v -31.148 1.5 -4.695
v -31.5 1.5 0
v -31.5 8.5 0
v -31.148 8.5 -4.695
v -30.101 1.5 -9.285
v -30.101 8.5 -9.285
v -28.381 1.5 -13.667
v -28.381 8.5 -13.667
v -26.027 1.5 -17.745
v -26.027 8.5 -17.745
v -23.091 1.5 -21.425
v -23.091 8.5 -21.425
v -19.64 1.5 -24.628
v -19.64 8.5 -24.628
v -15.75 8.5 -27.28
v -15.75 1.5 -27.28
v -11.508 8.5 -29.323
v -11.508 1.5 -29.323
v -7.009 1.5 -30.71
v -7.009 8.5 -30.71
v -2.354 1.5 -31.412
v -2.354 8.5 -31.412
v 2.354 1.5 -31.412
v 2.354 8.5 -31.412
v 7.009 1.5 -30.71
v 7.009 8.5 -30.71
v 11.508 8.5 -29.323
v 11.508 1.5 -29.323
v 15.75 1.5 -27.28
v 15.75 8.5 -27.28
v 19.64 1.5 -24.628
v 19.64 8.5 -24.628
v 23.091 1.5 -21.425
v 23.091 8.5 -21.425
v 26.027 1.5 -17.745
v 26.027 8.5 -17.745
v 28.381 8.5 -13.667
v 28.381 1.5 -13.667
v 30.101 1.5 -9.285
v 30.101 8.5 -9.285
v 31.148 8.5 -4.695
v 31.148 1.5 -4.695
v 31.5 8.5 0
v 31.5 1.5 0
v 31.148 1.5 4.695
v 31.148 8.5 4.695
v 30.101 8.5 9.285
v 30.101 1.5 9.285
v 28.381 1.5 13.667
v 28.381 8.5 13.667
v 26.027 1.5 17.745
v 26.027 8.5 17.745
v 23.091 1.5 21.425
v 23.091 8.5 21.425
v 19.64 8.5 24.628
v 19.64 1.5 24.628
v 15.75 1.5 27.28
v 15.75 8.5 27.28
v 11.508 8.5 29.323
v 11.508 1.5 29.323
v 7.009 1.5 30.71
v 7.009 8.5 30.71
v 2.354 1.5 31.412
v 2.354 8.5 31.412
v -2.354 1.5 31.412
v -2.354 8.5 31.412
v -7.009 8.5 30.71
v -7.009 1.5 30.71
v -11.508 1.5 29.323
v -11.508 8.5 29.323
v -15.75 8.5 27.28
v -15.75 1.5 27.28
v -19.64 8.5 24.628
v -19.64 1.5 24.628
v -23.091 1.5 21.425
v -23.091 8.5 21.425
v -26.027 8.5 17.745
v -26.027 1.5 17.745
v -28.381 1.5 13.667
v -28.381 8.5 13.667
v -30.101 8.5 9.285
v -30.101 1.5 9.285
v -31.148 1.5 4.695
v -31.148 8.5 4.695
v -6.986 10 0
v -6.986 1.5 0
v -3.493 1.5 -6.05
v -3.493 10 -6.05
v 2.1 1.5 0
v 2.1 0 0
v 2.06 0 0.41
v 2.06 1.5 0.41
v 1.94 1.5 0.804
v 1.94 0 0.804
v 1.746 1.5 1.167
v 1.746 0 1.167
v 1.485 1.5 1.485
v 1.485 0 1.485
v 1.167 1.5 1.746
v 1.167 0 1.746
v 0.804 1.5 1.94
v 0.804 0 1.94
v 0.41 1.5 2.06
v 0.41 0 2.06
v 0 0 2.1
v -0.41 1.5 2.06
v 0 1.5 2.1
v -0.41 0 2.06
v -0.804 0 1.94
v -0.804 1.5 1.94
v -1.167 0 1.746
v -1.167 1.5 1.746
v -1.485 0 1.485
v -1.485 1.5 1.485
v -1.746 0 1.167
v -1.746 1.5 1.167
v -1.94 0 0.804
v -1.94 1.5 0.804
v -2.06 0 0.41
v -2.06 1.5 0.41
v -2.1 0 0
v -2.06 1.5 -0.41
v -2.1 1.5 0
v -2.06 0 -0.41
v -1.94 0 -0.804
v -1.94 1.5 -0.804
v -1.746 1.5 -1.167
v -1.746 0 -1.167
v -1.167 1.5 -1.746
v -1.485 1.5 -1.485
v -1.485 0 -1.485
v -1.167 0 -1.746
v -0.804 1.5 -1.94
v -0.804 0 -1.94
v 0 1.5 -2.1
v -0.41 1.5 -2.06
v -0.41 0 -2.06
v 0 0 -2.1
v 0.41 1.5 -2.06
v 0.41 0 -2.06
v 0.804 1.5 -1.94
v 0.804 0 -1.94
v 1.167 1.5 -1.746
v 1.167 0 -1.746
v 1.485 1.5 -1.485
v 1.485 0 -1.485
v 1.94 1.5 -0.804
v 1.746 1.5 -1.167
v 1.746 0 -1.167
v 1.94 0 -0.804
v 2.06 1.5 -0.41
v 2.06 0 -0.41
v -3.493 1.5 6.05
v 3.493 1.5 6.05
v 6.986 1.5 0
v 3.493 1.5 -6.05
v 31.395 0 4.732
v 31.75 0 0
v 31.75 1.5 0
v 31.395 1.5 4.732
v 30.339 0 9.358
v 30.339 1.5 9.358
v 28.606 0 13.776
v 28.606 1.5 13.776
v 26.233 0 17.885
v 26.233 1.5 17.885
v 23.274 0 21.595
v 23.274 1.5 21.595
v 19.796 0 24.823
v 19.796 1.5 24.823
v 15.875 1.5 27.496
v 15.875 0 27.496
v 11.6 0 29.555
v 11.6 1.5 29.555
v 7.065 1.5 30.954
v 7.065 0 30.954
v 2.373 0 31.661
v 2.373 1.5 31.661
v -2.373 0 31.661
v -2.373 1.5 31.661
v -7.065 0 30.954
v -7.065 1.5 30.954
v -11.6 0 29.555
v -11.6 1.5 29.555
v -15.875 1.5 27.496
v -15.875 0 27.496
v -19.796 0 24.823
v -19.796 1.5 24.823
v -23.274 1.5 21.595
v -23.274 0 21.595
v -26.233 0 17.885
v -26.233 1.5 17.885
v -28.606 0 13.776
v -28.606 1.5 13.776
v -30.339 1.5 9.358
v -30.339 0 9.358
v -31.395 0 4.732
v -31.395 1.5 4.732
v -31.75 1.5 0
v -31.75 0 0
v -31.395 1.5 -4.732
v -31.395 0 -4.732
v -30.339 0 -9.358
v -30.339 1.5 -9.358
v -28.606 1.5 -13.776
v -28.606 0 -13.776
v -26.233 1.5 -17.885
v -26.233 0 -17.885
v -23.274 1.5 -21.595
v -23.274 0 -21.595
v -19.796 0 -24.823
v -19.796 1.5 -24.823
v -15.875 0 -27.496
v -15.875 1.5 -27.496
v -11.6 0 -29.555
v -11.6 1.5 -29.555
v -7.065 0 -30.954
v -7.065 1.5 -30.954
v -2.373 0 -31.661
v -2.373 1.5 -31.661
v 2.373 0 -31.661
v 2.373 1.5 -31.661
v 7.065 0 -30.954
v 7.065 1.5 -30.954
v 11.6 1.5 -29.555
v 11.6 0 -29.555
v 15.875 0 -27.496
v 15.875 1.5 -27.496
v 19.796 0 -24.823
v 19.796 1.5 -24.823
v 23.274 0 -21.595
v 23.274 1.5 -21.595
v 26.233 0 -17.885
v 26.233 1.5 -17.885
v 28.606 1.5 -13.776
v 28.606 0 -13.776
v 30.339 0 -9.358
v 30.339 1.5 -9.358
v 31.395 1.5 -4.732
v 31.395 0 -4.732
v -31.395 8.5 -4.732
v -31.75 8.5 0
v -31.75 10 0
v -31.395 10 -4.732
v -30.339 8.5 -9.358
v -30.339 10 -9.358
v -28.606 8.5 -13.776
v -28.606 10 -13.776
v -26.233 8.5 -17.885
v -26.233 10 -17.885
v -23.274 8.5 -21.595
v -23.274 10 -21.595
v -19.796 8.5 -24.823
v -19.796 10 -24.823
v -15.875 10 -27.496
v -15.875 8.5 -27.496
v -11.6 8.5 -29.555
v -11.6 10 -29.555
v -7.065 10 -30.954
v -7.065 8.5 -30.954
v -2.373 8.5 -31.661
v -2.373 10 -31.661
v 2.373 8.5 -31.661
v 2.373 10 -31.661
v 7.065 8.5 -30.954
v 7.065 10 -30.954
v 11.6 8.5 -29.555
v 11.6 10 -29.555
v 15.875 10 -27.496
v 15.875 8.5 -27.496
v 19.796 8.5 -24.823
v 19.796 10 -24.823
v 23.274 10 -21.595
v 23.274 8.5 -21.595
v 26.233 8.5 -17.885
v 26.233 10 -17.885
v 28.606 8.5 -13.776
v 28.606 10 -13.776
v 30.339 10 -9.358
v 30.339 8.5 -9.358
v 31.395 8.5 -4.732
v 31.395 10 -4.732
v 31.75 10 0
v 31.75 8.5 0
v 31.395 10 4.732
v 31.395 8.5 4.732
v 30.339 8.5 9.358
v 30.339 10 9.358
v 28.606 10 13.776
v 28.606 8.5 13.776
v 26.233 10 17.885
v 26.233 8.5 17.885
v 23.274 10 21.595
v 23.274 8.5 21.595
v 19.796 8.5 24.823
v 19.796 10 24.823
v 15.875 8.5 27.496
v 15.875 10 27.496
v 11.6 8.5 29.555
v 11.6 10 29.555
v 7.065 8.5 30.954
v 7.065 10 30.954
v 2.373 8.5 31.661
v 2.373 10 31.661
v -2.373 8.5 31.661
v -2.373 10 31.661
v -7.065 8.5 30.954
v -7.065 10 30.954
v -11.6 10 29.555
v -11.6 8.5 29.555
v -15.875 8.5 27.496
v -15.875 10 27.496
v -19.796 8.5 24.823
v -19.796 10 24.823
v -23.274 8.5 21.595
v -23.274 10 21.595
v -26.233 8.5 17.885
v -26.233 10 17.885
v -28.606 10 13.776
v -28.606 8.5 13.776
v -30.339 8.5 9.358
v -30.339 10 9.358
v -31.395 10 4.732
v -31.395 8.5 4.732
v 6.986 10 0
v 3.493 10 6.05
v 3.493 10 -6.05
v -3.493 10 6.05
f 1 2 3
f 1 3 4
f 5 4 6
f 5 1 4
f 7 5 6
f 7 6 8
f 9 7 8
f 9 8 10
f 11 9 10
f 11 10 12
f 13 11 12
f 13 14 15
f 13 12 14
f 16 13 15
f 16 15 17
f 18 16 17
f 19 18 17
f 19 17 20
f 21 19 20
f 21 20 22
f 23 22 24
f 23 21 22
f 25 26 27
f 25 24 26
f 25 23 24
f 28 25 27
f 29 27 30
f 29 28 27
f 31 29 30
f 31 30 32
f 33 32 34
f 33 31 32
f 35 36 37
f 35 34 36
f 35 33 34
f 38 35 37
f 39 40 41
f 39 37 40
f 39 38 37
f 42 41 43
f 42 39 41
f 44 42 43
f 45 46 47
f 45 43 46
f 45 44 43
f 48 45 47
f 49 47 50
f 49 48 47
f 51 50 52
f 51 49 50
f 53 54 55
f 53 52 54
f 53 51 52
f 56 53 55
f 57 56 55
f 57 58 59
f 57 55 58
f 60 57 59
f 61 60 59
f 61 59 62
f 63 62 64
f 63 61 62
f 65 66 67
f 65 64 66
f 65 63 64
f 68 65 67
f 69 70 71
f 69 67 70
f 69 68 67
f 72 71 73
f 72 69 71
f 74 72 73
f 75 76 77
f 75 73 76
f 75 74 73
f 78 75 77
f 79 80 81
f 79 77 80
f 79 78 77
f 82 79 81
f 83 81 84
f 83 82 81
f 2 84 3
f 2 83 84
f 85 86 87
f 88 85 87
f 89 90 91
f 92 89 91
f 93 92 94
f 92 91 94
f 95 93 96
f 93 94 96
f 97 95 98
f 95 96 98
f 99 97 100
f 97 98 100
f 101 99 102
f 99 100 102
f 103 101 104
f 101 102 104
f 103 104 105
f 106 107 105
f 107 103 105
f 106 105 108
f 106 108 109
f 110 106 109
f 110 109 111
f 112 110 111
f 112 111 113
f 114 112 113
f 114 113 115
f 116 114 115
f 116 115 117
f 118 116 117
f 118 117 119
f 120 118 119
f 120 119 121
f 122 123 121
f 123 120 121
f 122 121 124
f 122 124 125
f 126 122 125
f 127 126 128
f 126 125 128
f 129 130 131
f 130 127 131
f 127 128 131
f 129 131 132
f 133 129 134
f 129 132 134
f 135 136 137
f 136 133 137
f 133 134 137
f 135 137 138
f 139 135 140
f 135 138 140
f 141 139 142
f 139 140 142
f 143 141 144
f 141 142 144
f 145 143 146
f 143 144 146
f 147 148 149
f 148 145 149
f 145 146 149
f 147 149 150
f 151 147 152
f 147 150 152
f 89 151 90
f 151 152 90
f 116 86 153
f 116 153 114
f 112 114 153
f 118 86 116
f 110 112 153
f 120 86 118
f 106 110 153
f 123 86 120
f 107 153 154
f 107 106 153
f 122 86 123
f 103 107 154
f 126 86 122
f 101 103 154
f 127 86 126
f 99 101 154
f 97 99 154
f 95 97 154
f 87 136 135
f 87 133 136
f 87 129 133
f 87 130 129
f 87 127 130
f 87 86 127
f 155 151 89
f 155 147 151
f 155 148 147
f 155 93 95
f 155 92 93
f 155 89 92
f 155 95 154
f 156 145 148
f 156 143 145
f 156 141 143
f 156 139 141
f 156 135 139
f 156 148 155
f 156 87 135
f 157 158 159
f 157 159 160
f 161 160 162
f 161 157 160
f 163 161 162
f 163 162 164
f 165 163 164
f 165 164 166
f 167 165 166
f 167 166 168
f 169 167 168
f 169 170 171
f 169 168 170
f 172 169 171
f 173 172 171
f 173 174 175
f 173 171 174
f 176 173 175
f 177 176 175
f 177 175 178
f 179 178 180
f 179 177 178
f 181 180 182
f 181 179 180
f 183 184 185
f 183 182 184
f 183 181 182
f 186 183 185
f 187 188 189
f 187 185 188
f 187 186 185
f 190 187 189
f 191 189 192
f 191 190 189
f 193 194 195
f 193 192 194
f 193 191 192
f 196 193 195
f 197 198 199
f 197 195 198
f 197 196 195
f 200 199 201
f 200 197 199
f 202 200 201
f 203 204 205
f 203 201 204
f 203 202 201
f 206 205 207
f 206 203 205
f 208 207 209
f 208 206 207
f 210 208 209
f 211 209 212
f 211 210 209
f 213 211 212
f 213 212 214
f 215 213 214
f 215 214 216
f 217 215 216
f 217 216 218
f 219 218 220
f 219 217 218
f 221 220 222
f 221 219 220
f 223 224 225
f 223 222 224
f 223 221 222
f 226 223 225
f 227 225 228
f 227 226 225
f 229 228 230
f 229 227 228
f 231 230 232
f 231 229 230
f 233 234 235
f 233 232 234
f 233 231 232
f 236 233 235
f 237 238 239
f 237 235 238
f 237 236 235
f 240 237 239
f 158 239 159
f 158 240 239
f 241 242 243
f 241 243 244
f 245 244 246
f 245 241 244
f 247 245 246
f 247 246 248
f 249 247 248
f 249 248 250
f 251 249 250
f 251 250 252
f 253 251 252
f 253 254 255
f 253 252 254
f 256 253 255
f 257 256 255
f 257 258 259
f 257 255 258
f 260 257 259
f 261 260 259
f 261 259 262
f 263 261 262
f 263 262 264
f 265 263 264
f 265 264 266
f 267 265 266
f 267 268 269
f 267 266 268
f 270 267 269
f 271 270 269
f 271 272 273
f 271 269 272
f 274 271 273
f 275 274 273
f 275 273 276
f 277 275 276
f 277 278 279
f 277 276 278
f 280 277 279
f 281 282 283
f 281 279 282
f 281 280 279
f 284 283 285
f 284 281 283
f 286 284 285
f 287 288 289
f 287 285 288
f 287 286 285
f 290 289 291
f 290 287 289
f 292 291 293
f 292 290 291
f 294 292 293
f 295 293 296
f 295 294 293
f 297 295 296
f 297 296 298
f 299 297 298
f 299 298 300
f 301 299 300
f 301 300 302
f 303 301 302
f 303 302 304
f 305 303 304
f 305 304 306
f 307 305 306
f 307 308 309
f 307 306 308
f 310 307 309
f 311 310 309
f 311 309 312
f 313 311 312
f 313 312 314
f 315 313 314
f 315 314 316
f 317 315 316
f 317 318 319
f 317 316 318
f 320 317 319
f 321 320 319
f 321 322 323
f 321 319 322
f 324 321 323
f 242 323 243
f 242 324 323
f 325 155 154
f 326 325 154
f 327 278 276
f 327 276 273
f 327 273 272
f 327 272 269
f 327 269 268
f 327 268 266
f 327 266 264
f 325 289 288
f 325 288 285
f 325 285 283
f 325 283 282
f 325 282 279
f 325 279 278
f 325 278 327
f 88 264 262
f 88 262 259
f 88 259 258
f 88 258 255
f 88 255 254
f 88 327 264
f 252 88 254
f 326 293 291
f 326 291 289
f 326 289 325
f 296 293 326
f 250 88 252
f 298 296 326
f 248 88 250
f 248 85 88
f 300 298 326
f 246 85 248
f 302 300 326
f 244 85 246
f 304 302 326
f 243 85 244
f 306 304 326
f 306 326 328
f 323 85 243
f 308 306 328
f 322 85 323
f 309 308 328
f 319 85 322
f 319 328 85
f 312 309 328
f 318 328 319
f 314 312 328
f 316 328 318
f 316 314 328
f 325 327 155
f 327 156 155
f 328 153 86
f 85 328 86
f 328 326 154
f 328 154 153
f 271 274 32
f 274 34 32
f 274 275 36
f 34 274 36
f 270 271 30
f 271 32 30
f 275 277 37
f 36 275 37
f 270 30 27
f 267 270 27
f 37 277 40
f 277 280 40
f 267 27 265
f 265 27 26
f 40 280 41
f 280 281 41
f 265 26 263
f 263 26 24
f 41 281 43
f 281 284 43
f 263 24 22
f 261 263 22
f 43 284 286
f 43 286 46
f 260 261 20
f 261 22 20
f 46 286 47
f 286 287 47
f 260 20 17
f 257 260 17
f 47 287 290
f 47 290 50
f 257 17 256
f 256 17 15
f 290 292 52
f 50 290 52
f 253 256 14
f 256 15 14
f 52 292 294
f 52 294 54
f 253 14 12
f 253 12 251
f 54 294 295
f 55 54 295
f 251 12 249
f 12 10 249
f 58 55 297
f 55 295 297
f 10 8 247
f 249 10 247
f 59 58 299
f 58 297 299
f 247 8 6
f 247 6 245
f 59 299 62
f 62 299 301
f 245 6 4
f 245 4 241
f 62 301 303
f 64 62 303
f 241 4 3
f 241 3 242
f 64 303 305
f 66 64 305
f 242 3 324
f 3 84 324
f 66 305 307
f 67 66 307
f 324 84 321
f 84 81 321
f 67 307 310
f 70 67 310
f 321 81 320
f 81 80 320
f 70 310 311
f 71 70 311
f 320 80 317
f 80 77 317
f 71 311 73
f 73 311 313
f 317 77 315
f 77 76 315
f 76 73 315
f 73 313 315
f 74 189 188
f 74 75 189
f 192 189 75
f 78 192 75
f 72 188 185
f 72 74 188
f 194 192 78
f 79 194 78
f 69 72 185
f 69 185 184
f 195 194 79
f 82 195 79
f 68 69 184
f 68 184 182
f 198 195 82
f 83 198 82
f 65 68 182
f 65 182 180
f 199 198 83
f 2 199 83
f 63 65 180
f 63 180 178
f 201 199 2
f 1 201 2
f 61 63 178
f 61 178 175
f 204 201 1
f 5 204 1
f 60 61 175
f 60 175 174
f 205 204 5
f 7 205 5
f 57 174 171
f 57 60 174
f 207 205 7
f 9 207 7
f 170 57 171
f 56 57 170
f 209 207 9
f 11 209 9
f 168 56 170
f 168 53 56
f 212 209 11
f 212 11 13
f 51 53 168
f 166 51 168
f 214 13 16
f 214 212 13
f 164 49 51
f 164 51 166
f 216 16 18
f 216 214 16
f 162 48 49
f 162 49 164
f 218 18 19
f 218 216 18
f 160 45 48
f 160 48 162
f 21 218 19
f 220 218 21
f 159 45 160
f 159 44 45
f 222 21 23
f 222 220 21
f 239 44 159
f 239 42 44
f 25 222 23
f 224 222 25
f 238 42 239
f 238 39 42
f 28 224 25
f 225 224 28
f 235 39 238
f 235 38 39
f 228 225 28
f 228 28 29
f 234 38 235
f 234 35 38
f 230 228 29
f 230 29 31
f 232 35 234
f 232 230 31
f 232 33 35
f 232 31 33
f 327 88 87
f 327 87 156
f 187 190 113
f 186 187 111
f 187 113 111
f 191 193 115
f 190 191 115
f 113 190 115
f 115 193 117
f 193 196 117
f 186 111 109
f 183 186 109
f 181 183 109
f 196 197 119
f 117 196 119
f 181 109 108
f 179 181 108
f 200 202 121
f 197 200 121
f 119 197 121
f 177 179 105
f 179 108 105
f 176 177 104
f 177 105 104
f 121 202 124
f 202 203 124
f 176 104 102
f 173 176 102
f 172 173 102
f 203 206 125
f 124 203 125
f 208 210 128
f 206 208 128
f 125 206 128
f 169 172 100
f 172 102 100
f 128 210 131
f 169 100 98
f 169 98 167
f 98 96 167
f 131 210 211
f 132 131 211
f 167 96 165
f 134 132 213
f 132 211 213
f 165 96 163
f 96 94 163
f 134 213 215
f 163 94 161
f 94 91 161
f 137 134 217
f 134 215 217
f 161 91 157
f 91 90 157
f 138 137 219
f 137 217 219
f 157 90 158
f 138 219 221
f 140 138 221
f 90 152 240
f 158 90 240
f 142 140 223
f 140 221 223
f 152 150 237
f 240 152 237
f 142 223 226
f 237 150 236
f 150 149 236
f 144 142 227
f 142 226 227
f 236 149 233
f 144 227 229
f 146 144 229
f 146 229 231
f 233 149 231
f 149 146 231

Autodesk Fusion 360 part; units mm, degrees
sketch "spodek" plane through (0, 0, 0) normal (0, 1, 0) x (1, 0, 0)
  circle A0 centre (0, 0) radius 31.75
  circle A1 centre (0, 0) radius 2.1
  dimension "d1" = 63.5
  dimension "d2" = 4.2
extrude "Extrude1" add sketch "spodek" along normal blind 1.5
sketch "prostredek" plane through (0, 1.5, 0) normal (0, 1, 0) x (-1, 0, 0)
  circle A0 centre (0, 0) radius 2.1
  circle A1 centre (0, 0) radius 31.75
  circle A2 centre (0, 0) radius 31.5
  line L0 (3.493, -6.05) -> (6.9859, 0)
  line L1 (6.9859, 0) -> (3.493, 6.05)
  line L2 (3.493, 6.05) -> (-3.493, 6.05)
  line L3 (-3.493, 6.05) -> (-6.9859, 0)
  line L4 (-6.9859, 0) -> (-3.493, -6.05)
  line L5 (-3.493, -6.05) -> (3.493, -6.05)
  dimension "d5" = -0.25
  dimension "d6" = 6.05
extrude "Extrude2" add sketch "prostredek" along normal blind 7 contours A2
sketch "Sketch3" plane through (0, 8.5, 0) normal (0, 1, 0) x (-1, 0, 0)
  line L0 (3.493, -6.05) -> (-3.493, -6.05)
  line L1 (-3.493, -6.05) -> (-6.9859, 0)
  line L2 (-6.9859, 0) -> (-3.493, 6.05)
  line L3 (-3.493, 6.05) -> (3.493, 6.05)
  line L4 (3.493, 6.05) -> (6.9859, 0)
  line L5 (6.9859, 0) -> (3.493, -6.05)
  line L6 (-6.9859, 0) -> (-3.493, 6.05)
  line L7 (-3.493, -6.05) -> (-6.9859, 0)
  line L8 (3.493, -6.05) -> (-3.493, -6.05)
  line L9 (6.9859, 0) -> (3.493, -6.05)
  line L10 (-3.493, 6.05) -> (3.493, 6.05)
  circle A0 centre (0, 0) radius 31.75
extrude "Extrude3" add sketch "Sketch3" along normal blind 1.5
